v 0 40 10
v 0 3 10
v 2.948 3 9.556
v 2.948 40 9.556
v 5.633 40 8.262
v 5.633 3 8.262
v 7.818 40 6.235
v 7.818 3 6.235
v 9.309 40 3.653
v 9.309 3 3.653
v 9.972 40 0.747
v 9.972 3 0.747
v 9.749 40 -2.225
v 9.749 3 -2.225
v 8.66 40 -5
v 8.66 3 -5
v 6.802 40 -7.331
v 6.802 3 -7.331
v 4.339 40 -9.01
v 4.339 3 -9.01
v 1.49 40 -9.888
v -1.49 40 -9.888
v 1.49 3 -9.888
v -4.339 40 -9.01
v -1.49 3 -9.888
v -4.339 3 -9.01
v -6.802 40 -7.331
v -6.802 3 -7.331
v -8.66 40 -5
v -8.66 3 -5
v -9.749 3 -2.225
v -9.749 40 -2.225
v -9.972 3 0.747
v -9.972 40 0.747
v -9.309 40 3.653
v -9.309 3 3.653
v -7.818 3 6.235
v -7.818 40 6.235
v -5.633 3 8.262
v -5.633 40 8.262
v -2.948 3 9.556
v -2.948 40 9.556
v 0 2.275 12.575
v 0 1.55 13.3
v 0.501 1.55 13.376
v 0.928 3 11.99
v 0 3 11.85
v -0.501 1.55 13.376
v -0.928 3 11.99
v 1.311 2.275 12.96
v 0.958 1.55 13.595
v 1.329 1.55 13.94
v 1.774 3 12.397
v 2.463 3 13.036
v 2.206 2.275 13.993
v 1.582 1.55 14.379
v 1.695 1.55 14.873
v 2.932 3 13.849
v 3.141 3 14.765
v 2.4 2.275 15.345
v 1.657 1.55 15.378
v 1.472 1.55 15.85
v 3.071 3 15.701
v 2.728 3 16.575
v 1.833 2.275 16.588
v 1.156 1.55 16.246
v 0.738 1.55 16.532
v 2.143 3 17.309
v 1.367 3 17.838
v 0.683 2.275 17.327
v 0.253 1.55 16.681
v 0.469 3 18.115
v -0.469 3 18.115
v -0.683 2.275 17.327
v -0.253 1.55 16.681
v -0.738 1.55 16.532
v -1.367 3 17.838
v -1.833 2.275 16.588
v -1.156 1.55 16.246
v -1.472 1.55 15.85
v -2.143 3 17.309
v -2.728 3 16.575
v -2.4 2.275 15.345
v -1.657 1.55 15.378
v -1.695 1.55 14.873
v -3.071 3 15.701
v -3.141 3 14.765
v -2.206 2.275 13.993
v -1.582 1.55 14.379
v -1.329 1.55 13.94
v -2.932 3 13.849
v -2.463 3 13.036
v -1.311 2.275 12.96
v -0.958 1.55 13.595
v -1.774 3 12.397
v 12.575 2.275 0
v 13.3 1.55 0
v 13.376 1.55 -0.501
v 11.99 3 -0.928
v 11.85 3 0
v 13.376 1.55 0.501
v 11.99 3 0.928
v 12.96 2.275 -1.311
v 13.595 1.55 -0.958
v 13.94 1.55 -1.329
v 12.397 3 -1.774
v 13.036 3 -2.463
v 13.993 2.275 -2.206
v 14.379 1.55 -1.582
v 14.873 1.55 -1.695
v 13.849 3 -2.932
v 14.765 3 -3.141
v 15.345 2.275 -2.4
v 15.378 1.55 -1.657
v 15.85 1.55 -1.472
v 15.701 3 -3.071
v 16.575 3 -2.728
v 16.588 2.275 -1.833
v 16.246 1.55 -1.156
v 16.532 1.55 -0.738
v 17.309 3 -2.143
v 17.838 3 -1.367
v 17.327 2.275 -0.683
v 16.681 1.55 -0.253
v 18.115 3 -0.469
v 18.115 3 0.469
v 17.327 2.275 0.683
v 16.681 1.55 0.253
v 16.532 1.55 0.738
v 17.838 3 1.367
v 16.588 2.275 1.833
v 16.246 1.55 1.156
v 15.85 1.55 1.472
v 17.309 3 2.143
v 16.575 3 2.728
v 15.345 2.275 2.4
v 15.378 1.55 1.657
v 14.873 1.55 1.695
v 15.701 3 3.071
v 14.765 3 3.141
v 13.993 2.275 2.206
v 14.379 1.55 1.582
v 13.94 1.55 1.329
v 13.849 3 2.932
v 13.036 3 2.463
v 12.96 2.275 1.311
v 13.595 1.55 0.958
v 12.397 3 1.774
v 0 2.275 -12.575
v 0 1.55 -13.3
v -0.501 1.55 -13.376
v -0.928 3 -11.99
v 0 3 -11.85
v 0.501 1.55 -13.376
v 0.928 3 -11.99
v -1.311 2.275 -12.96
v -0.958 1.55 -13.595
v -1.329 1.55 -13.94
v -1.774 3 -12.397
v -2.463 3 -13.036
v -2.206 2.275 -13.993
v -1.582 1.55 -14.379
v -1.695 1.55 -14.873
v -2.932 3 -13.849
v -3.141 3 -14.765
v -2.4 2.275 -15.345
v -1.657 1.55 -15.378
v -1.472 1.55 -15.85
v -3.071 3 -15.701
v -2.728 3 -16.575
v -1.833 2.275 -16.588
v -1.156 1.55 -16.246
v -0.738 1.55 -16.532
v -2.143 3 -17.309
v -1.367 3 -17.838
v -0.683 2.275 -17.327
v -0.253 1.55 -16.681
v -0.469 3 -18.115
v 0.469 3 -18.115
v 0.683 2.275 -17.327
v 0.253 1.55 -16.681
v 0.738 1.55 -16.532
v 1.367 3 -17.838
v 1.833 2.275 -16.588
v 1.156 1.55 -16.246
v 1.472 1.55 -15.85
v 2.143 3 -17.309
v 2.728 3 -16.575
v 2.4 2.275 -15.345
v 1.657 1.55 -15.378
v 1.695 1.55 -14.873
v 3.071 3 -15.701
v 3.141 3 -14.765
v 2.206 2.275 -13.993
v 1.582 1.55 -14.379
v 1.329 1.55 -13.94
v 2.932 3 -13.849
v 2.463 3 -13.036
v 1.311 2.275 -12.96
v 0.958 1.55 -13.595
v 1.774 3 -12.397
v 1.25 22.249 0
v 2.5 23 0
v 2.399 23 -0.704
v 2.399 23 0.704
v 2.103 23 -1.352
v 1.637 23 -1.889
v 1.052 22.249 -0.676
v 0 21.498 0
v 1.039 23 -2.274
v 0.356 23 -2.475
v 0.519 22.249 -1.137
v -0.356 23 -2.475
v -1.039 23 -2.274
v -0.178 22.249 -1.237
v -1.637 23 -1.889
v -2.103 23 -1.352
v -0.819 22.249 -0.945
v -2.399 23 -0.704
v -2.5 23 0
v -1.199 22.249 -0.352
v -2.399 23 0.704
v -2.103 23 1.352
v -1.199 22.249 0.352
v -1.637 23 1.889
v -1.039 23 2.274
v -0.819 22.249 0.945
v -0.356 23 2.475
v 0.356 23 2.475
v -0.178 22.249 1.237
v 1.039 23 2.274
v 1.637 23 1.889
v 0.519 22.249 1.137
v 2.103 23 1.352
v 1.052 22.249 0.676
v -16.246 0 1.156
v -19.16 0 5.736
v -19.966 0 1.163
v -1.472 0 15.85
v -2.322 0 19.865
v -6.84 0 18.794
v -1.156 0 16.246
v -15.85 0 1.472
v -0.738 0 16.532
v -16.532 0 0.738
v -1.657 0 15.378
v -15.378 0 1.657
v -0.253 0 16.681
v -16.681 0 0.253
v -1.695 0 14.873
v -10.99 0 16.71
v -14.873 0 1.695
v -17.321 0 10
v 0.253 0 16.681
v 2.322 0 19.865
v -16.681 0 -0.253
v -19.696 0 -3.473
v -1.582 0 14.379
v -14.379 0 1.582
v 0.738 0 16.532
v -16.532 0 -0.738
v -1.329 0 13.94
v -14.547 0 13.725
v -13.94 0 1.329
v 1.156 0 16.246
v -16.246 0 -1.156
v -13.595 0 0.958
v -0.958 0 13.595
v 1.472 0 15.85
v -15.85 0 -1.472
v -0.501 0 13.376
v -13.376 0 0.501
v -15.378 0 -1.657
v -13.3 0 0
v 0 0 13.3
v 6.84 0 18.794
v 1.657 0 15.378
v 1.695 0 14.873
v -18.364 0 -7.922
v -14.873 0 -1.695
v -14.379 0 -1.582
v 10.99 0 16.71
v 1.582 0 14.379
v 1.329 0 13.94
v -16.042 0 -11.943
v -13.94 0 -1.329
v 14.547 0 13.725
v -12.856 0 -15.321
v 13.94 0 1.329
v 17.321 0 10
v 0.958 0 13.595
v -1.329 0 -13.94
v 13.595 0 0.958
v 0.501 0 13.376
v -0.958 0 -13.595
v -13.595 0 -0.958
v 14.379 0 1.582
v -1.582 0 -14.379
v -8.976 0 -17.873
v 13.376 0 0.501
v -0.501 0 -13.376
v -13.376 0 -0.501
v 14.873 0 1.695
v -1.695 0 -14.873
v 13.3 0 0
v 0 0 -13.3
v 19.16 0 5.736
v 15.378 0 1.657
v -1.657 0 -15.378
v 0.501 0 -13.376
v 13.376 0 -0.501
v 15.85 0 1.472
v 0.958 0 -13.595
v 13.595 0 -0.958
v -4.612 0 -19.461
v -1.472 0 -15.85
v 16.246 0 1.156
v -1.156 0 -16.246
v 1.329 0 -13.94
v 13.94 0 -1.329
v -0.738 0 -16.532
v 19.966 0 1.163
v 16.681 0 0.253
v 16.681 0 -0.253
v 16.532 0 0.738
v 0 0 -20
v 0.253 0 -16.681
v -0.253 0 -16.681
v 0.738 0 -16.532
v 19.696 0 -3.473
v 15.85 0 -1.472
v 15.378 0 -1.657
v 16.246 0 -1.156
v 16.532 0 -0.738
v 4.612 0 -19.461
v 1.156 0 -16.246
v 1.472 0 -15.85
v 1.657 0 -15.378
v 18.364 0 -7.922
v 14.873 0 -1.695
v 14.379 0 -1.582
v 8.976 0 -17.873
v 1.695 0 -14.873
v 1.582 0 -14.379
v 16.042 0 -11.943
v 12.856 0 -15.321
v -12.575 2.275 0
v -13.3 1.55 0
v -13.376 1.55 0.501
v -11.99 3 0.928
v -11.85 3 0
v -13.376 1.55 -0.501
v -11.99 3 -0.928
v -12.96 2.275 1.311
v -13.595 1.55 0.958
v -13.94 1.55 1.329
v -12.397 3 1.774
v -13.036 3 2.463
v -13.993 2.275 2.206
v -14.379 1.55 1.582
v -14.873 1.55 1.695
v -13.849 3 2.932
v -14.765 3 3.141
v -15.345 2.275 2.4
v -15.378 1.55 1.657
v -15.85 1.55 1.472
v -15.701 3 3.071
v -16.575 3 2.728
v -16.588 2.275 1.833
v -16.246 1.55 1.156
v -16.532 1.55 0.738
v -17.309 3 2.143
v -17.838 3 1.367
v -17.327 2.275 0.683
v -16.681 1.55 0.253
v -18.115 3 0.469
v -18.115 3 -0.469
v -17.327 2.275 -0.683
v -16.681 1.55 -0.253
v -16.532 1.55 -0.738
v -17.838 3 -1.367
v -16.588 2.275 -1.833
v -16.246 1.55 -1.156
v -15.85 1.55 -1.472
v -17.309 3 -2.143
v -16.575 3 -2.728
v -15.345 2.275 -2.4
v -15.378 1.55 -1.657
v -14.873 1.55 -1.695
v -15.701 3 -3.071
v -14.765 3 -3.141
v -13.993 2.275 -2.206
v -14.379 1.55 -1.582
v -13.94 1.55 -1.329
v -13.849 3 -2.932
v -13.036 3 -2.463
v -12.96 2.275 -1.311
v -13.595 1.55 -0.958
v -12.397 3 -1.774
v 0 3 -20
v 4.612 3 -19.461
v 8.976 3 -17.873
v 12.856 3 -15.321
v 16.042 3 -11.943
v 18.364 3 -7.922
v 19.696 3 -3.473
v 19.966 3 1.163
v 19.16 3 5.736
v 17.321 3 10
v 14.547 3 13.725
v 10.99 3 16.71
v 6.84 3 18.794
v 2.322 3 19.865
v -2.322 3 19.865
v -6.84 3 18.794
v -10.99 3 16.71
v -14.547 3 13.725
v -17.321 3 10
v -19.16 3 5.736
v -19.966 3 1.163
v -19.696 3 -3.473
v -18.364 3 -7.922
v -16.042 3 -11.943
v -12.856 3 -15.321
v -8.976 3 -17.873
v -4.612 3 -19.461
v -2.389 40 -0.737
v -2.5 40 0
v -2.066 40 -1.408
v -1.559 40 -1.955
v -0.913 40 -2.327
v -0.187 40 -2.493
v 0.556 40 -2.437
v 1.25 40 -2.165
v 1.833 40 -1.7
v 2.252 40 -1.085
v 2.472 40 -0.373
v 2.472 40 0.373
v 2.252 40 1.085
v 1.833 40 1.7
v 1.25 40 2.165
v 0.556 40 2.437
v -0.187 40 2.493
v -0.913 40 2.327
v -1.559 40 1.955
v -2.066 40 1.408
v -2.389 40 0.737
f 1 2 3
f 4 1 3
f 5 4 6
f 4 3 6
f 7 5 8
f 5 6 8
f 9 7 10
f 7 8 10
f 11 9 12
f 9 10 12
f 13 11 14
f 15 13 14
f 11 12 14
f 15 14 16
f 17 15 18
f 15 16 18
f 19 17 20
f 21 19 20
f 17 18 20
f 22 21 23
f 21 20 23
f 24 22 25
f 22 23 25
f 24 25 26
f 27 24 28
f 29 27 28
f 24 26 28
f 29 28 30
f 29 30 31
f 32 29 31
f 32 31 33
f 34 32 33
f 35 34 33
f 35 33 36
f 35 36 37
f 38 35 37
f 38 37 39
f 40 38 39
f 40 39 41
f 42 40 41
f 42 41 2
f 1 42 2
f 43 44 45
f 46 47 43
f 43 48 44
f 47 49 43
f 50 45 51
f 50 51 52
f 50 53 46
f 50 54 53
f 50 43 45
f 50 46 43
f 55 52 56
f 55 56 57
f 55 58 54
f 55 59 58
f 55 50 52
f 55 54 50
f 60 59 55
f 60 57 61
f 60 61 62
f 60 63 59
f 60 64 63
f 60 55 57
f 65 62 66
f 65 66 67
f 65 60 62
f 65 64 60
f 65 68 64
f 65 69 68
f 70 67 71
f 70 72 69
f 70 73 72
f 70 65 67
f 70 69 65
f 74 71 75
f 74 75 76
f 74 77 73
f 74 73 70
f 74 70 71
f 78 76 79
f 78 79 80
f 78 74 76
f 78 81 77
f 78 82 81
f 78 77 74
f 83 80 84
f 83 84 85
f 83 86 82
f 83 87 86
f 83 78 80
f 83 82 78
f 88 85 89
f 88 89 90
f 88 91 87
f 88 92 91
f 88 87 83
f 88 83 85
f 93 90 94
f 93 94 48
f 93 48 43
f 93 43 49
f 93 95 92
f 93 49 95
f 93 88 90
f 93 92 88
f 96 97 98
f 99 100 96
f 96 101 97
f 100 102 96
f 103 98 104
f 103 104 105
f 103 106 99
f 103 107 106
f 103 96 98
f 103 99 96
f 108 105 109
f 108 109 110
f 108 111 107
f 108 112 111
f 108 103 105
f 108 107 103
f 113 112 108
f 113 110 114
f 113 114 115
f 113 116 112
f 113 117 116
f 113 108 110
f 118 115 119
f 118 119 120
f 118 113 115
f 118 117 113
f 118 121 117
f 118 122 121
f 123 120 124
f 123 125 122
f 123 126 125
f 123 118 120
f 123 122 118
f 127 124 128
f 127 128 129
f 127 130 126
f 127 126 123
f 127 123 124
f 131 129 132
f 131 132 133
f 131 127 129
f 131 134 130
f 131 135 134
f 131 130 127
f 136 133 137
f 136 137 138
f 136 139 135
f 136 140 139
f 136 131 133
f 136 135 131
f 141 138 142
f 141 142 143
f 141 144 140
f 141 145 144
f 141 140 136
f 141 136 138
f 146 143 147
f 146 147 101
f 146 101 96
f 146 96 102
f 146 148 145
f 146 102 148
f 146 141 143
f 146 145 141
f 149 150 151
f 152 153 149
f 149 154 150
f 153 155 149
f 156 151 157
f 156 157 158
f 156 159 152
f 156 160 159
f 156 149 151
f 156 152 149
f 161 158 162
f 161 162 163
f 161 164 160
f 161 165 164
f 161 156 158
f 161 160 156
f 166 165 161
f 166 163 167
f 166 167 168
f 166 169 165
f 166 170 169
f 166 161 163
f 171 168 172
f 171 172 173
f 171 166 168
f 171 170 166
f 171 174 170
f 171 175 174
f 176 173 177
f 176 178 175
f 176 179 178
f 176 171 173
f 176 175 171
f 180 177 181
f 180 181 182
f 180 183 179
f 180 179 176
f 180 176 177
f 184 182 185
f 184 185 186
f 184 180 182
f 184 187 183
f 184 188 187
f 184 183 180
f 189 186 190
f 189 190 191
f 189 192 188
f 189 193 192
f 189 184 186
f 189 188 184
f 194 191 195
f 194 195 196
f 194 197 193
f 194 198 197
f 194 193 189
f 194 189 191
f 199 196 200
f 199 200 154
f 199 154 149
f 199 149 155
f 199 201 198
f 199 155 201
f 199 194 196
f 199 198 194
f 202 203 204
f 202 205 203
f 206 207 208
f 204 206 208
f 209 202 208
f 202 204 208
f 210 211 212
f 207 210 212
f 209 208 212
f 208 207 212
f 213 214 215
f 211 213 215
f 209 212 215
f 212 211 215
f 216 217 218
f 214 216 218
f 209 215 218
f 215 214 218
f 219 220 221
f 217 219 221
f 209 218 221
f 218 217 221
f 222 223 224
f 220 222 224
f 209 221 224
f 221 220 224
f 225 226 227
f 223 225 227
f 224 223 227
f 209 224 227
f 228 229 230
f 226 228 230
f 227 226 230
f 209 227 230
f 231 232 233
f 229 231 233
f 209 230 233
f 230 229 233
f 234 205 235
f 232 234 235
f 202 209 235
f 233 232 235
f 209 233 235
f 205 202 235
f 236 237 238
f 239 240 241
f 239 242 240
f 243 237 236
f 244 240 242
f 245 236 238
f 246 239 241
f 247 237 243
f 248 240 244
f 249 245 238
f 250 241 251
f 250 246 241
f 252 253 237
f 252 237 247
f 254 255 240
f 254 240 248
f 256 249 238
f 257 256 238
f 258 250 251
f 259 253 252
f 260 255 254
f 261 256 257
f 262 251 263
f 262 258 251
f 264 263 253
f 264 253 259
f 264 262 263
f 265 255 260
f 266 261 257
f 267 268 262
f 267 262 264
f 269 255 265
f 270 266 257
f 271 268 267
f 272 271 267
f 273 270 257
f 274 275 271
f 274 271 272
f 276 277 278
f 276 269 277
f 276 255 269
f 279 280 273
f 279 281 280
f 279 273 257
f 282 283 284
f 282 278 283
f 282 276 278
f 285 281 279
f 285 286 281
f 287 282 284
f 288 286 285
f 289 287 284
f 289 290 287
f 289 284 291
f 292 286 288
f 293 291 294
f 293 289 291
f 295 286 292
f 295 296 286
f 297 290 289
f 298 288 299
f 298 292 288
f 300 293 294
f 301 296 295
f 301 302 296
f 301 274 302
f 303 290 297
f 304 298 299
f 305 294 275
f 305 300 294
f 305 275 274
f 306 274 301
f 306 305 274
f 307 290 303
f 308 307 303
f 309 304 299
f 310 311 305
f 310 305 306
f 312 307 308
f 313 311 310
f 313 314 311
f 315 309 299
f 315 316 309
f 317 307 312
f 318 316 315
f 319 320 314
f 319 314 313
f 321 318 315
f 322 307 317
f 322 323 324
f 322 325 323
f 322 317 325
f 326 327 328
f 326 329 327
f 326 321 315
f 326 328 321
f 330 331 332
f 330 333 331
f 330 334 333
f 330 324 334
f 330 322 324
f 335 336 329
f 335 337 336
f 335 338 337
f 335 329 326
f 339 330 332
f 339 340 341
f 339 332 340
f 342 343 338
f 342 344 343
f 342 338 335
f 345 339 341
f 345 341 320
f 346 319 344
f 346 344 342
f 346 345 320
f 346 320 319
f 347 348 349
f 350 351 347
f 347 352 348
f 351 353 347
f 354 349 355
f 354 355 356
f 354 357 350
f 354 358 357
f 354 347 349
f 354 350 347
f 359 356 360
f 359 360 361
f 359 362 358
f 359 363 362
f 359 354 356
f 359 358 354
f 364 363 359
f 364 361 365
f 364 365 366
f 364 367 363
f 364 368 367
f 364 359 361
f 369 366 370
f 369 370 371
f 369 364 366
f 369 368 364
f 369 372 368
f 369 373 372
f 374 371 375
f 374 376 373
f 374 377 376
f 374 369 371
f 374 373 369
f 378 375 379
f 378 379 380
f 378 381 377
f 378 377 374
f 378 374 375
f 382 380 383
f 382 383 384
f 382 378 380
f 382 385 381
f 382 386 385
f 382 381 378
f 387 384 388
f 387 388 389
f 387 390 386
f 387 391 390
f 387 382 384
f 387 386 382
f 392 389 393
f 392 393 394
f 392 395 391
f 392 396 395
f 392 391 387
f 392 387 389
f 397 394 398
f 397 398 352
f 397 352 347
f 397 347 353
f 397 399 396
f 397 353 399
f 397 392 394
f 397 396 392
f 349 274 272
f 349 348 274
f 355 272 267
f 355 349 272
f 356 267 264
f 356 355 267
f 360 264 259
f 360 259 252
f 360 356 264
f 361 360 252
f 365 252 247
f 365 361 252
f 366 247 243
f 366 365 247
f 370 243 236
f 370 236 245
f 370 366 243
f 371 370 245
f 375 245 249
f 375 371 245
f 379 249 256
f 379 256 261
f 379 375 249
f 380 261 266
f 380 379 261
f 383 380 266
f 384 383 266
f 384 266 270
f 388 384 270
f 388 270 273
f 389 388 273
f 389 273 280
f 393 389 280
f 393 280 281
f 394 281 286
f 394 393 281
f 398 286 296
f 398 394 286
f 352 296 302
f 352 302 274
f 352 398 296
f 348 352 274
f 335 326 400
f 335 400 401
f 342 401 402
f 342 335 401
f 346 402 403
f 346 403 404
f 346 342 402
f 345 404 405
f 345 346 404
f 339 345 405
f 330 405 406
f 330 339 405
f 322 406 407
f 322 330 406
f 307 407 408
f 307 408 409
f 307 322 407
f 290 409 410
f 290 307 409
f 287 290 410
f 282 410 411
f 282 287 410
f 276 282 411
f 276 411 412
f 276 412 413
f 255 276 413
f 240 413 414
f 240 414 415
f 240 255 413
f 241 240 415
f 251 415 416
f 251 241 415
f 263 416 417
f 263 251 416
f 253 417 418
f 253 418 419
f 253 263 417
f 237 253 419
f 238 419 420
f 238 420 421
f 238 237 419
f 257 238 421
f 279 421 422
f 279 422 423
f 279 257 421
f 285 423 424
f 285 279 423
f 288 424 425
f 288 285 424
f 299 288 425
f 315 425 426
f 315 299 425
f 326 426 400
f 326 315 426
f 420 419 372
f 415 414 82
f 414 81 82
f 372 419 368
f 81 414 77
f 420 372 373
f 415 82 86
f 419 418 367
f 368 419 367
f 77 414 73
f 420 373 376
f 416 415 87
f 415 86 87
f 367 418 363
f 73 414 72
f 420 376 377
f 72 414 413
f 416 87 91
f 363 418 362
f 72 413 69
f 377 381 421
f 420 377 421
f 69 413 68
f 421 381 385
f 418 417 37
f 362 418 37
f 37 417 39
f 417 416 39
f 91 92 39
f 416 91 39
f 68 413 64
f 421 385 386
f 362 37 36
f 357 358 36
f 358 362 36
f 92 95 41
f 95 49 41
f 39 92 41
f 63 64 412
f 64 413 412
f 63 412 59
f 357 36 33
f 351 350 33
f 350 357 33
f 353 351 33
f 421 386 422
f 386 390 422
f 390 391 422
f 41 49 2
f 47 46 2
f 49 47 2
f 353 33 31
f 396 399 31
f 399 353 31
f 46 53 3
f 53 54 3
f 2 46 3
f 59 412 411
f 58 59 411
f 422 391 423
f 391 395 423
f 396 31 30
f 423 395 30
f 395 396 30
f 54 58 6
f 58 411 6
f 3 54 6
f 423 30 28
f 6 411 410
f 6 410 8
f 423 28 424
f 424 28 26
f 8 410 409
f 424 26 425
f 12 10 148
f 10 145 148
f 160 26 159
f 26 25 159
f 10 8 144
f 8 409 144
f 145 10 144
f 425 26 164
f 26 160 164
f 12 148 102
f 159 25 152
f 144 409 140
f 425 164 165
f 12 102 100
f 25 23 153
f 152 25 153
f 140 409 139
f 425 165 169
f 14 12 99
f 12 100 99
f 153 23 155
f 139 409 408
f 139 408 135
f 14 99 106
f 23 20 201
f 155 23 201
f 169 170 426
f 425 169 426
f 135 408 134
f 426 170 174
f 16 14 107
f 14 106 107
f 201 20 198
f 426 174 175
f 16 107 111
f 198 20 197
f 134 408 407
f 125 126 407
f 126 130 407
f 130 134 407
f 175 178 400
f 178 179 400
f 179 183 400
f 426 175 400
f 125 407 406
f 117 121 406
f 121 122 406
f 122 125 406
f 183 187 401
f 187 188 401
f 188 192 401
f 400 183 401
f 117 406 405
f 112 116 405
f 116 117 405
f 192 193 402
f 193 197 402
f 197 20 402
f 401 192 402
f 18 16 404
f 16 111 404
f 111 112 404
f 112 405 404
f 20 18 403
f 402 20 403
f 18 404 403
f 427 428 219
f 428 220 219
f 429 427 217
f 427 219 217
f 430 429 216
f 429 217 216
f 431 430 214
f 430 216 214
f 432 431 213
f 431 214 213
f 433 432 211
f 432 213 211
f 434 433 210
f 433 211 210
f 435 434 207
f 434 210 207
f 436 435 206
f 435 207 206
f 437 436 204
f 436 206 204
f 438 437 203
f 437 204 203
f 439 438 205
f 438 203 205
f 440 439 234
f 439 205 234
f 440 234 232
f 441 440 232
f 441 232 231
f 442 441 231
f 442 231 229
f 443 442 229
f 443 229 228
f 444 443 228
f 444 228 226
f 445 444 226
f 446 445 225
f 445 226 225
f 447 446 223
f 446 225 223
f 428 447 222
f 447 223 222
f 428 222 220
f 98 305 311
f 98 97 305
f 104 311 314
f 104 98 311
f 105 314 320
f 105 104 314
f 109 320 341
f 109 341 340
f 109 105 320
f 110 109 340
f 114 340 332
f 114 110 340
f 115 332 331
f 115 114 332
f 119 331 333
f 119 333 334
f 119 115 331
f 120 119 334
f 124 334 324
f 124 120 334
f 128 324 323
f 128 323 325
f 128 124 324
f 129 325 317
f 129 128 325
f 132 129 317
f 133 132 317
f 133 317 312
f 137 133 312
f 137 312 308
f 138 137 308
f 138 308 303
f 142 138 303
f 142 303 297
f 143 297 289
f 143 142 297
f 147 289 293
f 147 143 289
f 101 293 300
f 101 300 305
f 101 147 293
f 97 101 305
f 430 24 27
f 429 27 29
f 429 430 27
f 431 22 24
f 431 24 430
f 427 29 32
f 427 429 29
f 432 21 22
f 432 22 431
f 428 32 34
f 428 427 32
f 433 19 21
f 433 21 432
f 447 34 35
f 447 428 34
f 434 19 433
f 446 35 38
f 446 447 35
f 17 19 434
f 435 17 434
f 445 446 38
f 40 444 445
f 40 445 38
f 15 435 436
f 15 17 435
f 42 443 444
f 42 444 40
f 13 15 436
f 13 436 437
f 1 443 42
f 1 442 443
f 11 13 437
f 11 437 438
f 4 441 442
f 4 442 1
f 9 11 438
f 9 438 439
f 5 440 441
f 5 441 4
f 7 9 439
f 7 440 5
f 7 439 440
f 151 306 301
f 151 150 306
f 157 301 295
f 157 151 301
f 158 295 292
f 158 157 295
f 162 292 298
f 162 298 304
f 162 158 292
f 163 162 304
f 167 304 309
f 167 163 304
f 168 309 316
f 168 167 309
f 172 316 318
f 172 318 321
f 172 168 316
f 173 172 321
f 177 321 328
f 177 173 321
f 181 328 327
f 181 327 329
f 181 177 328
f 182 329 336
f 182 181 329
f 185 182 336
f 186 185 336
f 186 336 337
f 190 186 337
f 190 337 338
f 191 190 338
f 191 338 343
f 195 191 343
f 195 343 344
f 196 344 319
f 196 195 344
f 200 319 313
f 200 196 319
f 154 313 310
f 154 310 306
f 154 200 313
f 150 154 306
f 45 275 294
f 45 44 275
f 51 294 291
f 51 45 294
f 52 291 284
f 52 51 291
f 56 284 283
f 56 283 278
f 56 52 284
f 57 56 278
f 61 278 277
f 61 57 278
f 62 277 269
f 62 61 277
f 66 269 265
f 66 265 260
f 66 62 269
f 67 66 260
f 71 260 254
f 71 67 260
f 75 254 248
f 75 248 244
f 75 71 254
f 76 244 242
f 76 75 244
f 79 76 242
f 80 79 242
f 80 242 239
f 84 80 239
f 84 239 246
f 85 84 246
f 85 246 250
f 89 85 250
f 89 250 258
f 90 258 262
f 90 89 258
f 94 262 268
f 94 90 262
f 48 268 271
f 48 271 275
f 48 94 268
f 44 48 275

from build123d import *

# Parameters (mm, degrees)
SKETCH1_R             = 10
BOSS_EXTRUDE1_DEPTH   = 40
SKETCH2_R             = 20
BOSS_EXTRUDE2_DEPTH   = 3
CIRPATTERN1_COUNT     = 4
M6_TAPPED_HOLE1_D     = 5
M6_TAPPED_HOLE1_DEPTH = 17
M6_TAPPED_HOLE1_TIP   = 1.502151548


with BuildPart() as part:
    # Sketch1 → Boss-Extrude1 (new body)
    with BuildSketch(Plane(origin=(0, 0, 0), x_dir=(1, 0, 0), z_dir=(0, 1, 0))):
        with Locations(Location((0, 0, 0), (0, 0, 270))):
            Circle(SKETCH1_R)
    extrude(amount=BOSS_EXTRUDE1_DEPTH)

    # Sketch2 → Boss-Extrude2 (add)
    with BuildSketch(Plane.XZ):
        with Locations(Location((0, 0, 0), (0, 0, 270))):
            Circle(SKETCH2_R)
    extrude(amount=-BOSS_EXTRUDE2_DEPTH)

    # Sketch3 → CSK for M3 Countersunk Flat Head Screw1 (revolve, cut)
    with BuildSketch(Plane(origin=(0, 3, -15), x_dir=(0, 0, 1), z_dir=(1, 0, 0))):
        Polygon((0, 0), (0, 3), (1.7, 3), (1.7, 1.45), (3.15, 0), align=None)
    csk_for_m3_countersunk_flat_head_screw1 = revolve(axis=Axis((0, 9.35, -15), (0, -1, 0)), mode=Mode.SUBTRACT)

    # CirPattern1: CSK for M3 Countersunk Flat Head Screw1 ×4 about axis
    cirpattern1_axis = Axis((0, 0, 0), (0, 1, 0))
    for i in range(1, CIRPATTERN1_COUNT):
        add(csk_for_m3_countersunk_flat_head_screw1.rotate(cirpattern1_axis, i * 360 / CIRPATTERN1_COUNT), mode=Mode.SUBTRACT)

    # M6 Tapped Hole1
    with Locations(Plane(origin=(0, 40, 0), x_dir=(1, 0, 0), z_dir=(0, 1, 0))):
        with Locations((0, 0)):
            Hole(M6_TAPPED_HOLE1_D / 2, depth=M6_TAPPED_HOLE1_DEPTH)
            with Locations((0, 0, -(M6_TAPPED_HOLE1_DEPTH + M6_TAPPED_HOLE1_TIP / 2))):  # 118° drill point
                Cone(0, M6_TAPPED_HOLE1_D / 2, M6_TAPPED_HOLE1_TIP, mode=Mode.SUBTRACT)


solid = part.part
